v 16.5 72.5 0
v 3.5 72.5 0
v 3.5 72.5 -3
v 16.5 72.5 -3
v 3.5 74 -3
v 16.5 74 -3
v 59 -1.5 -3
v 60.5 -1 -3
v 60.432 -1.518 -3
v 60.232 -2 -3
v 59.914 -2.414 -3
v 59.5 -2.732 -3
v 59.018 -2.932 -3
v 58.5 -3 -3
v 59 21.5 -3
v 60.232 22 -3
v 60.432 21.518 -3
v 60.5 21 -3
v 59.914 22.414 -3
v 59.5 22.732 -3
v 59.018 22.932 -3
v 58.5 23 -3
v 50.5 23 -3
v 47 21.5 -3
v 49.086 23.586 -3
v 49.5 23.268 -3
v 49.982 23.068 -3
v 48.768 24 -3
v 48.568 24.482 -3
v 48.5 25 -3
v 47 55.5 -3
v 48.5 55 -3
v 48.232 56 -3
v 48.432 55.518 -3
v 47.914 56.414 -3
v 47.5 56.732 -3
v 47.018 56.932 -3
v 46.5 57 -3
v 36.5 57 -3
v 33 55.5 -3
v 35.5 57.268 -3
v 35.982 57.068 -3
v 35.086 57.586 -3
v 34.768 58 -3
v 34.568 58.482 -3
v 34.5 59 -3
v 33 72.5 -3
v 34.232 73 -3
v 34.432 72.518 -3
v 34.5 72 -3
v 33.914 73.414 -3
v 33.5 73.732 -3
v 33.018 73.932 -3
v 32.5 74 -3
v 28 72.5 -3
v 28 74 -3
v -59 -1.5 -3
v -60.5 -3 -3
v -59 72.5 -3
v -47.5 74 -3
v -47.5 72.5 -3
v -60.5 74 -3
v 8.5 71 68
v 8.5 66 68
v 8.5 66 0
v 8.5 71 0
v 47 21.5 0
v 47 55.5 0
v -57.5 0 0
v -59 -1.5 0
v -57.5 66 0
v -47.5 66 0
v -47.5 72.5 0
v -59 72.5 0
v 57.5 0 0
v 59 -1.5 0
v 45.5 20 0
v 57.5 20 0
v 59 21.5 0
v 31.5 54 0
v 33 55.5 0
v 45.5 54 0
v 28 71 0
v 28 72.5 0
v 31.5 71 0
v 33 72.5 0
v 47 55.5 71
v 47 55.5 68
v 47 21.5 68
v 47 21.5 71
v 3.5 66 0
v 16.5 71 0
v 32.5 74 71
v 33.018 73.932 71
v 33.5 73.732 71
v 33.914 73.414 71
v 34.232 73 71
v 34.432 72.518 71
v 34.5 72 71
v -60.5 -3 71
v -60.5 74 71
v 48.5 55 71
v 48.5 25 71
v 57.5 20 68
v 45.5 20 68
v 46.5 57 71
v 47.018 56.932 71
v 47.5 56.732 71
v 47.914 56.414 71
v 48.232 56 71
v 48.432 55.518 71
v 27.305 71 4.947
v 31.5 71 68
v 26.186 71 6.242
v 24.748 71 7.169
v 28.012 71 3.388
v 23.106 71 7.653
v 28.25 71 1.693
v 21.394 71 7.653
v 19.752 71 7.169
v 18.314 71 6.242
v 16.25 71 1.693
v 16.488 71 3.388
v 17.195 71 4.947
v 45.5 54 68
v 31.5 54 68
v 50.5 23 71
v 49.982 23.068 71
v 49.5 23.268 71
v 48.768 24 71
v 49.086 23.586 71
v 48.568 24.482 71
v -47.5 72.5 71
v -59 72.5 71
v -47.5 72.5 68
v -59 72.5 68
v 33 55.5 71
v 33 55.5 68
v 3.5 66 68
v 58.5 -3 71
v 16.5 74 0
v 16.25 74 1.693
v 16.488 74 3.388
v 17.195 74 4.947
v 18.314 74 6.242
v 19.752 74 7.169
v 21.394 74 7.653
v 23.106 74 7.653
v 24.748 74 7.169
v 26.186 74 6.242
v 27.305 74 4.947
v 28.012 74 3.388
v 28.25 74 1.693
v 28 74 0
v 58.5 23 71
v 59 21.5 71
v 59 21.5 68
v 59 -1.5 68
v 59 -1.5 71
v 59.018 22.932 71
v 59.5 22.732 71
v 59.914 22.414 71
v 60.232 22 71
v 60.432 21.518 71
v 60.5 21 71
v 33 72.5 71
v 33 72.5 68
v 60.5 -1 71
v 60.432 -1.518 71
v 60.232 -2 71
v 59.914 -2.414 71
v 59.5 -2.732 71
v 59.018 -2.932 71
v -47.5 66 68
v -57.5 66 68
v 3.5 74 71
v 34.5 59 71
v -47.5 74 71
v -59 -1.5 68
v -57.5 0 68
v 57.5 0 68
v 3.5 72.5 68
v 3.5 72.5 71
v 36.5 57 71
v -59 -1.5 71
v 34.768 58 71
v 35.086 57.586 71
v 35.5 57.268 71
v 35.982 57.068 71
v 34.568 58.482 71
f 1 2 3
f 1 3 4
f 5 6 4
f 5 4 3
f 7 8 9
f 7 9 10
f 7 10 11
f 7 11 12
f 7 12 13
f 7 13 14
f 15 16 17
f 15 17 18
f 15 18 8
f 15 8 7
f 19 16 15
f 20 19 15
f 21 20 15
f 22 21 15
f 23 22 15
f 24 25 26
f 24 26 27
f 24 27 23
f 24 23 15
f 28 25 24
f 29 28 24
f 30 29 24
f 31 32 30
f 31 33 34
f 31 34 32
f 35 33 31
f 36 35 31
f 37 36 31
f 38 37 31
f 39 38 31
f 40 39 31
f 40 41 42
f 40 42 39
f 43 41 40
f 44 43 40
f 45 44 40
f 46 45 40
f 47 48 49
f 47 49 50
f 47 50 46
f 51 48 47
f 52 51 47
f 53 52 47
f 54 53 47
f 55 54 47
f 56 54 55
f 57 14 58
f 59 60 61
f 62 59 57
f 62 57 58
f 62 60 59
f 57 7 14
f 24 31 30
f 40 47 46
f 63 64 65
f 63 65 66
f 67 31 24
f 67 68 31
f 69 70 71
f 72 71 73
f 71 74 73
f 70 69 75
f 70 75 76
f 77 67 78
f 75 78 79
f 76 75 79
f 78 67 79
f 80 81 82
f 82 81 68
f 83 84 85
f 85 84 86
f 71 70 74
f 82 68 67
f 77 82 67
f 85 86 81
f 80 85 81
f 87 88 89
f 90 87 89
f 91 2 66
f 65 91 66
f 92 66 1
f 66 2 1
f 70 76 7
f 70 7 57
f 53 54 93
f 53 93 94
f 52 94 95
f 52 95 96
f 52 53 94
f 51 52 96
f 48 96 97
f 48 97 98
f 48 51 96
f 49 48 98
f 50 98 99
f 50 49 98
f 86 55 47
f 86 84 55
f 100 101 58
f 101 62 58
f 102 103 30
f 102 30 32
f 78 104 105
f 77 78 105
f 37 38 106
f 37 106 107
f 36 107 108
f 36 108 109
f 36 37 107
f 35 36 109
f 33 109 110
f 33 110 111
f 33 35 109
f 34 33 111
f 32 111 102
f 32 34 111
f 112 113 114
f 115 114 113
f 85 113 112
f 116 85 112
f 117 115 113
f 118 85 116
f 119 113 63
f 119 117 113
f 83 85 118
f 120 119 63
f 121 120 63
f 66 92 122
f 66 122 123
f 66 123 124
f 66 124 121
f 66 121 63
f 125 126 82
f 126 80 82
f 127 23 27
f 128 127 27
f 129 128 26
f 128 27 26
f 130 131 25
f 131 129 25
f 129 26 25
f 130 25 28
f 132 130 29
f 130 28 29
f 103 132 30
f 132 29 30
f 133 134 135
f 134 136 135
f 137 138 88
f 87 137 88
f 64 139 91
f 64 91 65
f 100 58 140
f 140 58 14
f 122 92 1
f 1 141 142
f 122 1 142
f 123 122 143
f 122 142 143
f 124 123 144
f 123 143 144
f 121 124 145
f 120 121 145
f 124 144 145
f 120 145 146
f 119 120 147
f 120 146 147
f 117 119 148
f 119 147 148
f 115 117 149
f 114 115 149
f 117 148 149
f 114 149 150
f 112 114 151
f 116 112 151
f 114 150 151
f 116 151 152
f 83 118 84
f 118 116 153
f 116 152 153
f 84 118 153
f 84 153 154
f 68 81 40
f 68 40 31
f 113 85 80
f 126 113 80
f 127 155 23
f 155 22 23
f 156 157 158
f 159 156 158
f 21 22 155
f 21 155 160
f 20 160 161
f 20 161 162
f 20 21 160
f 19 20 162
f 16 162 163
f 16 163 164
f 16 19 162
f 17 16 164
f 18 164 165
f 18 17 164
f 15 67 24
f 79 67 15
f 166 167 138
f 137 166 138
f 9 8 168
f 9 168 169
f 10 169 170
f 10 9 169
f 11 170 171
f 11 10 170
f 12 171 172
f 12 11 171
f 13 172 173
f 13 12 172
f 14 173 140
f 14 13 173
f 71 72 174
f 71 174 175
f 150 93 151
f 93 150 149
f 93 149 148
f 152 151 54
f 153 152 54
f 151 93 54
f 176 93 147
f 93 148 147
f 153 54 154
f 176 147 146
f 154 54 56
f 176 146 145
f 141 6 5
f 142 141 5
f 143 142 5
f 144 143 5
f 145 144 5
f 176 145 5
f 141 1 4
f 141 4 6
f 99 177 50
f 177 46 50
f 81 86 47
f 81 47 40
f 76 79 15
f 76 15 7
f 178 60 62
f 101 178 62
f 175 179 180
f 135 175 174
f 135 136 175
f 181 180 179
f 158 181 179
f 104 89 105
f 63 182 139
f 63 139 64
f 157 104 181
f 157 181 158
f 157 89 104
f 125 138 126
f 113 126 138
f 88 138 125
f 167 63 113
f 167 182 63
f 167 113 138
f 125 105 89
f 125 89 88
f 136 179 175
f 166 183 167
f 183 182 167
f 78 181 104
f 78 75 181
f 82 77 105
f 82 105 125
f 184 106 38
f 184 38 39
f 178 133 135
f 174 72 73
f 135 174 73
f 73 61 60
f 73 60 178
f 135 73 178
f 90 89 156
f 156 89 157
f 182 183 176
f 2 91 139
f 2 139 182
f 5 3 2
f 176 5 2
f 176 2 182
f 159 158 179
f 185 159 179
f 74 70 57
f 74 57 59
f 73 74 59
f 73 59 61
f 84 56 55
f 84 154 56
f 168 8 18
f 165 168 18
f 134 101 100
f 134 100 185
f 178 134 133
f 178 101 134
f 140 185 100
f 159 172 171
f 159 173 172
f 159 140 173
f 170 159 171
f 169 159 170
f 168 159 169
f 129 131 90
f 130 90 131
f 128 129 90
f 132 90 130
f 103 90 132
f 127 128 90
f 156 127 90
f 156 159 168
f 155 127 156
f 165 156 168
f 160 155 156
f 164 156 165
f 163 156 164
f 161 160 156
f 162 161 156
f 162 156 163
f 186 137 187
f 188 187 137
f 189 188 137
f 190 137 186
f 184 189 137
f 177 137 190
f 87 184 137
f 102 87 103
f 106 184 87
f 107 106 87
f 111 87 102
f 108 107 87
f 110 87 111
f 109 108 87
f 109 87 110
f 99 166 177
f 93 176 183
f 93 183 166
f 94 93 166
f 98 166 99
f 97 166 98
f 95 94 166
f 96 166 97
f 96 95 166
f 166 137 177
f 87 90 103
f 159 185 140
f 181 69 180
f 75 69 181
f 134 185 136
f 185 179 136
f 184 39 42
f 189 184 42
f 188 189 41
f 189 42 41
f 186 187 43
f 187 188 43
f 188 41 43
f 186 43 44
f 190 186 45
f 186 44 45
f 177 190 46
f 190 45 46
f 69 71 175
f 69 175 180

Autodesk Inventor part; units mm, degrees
ref_plane "YZ Plane" through (0, 0, 0) normal (1, 0, 0) x (0, 1, 0)
ref_plane "XZ Plane" through (0, 0, 0) normal (0, 1, 0) x (-1, 0, 0)
ref_plane "XY Plane" through (0, 0, 0) normal (0, 0, 1) x (1, 0, 0)
sketch "Skizze1" plane through (0, 0, 0) normal (0, 0, 1) x (1, 0, 0)
  line L0 (-57.5, 0) -> (57.5, 0)
  line L1 (57.5, 0) -> (57.5, 20)
  line L2 (57.5, 20) -> (45.5, 20)
  line L3 (45.5, 20) -> (45.5, 54)
  line L4 (-57.5, 41) -> (-57.5, 0)
  line L5 (-57.5, 41) -> (-57.5, 41)
  line L6 (-57.5, 54) -> (-57.5, 54)
  line L7 (-57.5, 54) -> (-57.5, 41)
  line L8 (31.5, 71) -> (31.5, 54)
  line L9 (31.5, 54) -> (45.5, 54)
  circle A0 centre (-52, 2.832) radius 1.25
  circle A1 centre (30.6262, 2.832) radius 1.25
  circle A2 centre (30.6262, 51.168) radius 1.25
  circle A3 centre (-44.507, 51.168) radius 1.25
  line L10 (33.3762, 2.832) -> (33.3762, 0)
  line L11 (33.3762, 0) -> (27.8762, 0)
  line L12 (27.8762, 0) -> (27.8762, 2.832)
  arc A4 (33.3762, 2.832) -> (27.8762, 2.832) centre (30.6262, 2.832) ccw
  line L13 (-49.25, 0) -> (-49.25, 2.832)
  line L14 (-54.75, 0) -> (-54.75, 2.832)
  line L15 (-49.25, 0) -> (-54.75, 0)
  arc A5 (-49.25, 2.832) -> (-54.75, 2.832) centre (-52, 2.832) ccw
  line L16 (33.3762, 51.168) -> (33.3762, 54)
  line L17 (33.3762, 54) -> (27.8762, 54)
  line L18 (27.8762, 54) -> (27.8762, 51.168)
  arc A6 (27.8762, 51.168) -> (33.3762, 51.168) centre (30.6262, 51.168) ccw
  line L19 (-41.757, 51.168) -> (-41.757, 54)
  line L20 (-41.757, 54) -> (-47.257, 54)
  line L21 (-47.257, 54) -> (-47.257, 51.168)
  arc A7 (-47.257, 51.168) -> (-41.757, 51.168) centre (-44.507, 51.168) ccw
  line L22 (-57.5, 54) -> (31.5, 54)
  line L23 (31.5, 54) -> (31.5, 57)
  line L24 (31.5, 57) -> (-57.5, 57)
  line L25 (-57.5, 57) -> (-57.5, 54)
  line L26 (31.5, 71) -> (-57.5, 71)
  line L27 (-57.5, 71) -> (-57.5, 54)
  line L28 (48.5, 23) -> (60.5, 23)
  line L29 (60.5, 23) -> (60.5, -3)
  line L30 (60.5, -3) -> (-60.5, -3)
  line L31 (-60.5, -3) -> (-60.5, 44)
  line L32 (-60.5, 44) -> (-60.5, 44)
  line L33 (-60.5, 44) -> (-60.5, 57)
  line L34 (-60.5, 57) -> (-60.5, 57)
  line L35 (-60.5, 57) -> (-60.5, 74)
  line L36 (-60.5, 74) -> (34.5, 74)
  line L37 (34.5, 74) -> (34.5, 57)
  line L38 (34.5, 57) -> (48.5, 57)
  line L39 (48.5, 57) -> (48.5, 23)
  line L40 (-57.5, 71) -> (-47.5, 71)
  line L41 (-47.5, 71) -> (-47.5, 66)
  line L42 (-47.5, 66) -> (-57.5, 66)
  line L43 (-57.5, 66) -> (-57.5, 71)
  line L44 (8.5, 71) -> (3.5, 71)
  line L45 (3.5, 71) -> (3.5, 66)
  line L46 (3.5, 66) -> (8.5, 66)
  line L47 (8.5, 66) -> (8.5, 71)
  line L48 (-47.5, 71) -> (3.5, 71)
  line L49 (3.5, 71) -> (3.5, 74)
  line L50 (3.5, 74) -> (-47.5, 74)
  line L51 (-47.5, 74) -> (-47.5, 71)
  point P0 (0, 0)
  point P1 (0, 0)
  point P2 (0, 0)
  point P3 (0, 0)
  dimension "d0" = 115
  dimension "d1" = 12
  dimension "d2" = 20
  dimension "d3" = 41
  dimension "d4" = 54
  dimension "d5" = 5.5
  dimension "d6" = 82.6262
  dimension "d7" = 2.5
  dimension "d8" = 2.832
  dimension "d9" = 7.493
  dimension "d10" = 48.336
  dimension "d11" = 5.5
  dimension "d12" = 5.5
  dimension "d13" = 5.5
  dimension "d14" = 5.5
  dimension "d15" = 3
  dimension "d16" = 0
  dimension "d17" = 89
  dimension "d18" = 71
  dimension "d19" = 3
  dimension "d20" = 2.832
  dimension "d29" = 10
  dimension "d30" = 5
  dimension "d31" = 5
  dimension "d34" = 51
  dimension "d40" = 0
extrude "Extrusion1" add sketch "Skizze1" along normal blind 68 contours L0 L1 L2 L3 L9 L8 L26 L49 L36 L37 L38 L39 L28 L29 L30 L31 L33 L35 L51 L27 L25 L7 L4 | L27 L26 L41 L42 | L47 L46 L45 L26
sketch "Skizze3" plane through (3.5, 74, 0) normal (0, 1, 0) x (1, 0, 0)
  line L0 (31, 0) -> (31, -68) projected
  line L1 (28, 0) -> (5, 0) projected
  arc A0 (13, 0) -> (24.5, 0) centre (18.75, -1.7139) ccw
  line L2 (13, 0) -> (24.5, 0)
  point P0 (-3.5, 0)
  dimension "d35" = 6
  dimension "d36" = 12.25
  dimension "d39" = 11.5
extrude "Extrusion4" cut sketch "Skizze3" against normal up to surface (3 mm away)
sketch "Skizze4" plane through (0, 0, 68) normal (0, 0, 1) x (1, 0, 0)
  line L0 (57.5, 0) -> (-57.5, 0) projected
  line L1 (-47.5, 74) -> (-60.5, 74) projected
  line L2 (-60.5, 74) -> (-60.5, -3) projected
  line L3 (48.5, 23) -> (48.5, 57) projected
  line L4 (48.5, 57) -> (34.5, 57) projected
  line L5 (34.5, 74) -> (3.5, 74) projected
  line L6 (-47.5, 74) -> (-60.5, 74)
  line L7 (-60.5, 74) -> (-60.5, -3)
  line L8 (-60.5, -3) -> (60.5, -3)
  line L9 (60.5, -3) -> (60.5, 23)
  line L10 (60.5, 23) -> (48.5, 23)
  line L11 (48.5, 23) -> (48.5, 57)
  line L12 (48.5, 57) -> (34.5, 57)
  line L13 (34.5, 57) -> (34.5, 74)
  line L14 (34.5, 74) -> (3.5, 74)
  line L15 (3.5, 72.5) -> (33, 72.5)
  line L16 (33, 72.5) -> (33, 55.5)
  line L17 (33, 55.5) -> (47, 55.5)
  line L18 (47, 55.5) -> (47, 21.5)
  line L19 (47, 21.5) -> (59, 21.5)
  line L20 (59, 21.5) -> (59, -1.5)
  line L21 (59, -1.5) -> (-59, -1.5)
  line L22 (-59, -1.5) -> (-59, 72.5)
  line L23 (-59, 72.5) -> (-47.5, 72.5)
  line L24 (3.5, 72.5) -> (3.5, 74)
  line L25 (-47.5, 72.5) -> (-47.5, 74)
  point P0 (0, 0)
  dimension "d41" = 1.5
extrude "Extrusion5" add sketch "Skizze4" along normal blind 3
sketch "Skizze5" plane through (0, 0, 0) normal (0, 0, -1) x (-1, 0, 0)
  line L0 (-34.5, 74) -> (-34.5, 57) projected
  line L1 (-48.5, 23) -> (-60.5, 23) projected
  line L2 (47.5, 74) -> (47.5, 66) projected
  line L3 (-28, 74) -> (-34.5, 74)
  line L4 (-34.5, 74) -> (-34.5, 57)
  line L5 (-34.5, 57) -> (-48.5, 57)
  line L6 (-48.5, 57) -> (-48.5, 23)
  line L7 (-48.5, 23) -> (-60.5, 23)
  line L8 (-60.5, 23) -> (-60.5, -3)
  line L9 (60.5, 74) -> (60.5, -3) projected
  line L10 (-60.5, -3) -> (60.5, -3)
  line L11 (60.5, -3) -> (60.5, 74)
  line L12 (60.5, 74) -> (47.5, 74)
  line L13 (-28, 72.5) -> (-33, 72.5)
  line L14 (-33, 72.5) -> (-33, 55.5)
  line L15 (-33, 55.5) -> (-47, 55.5)
  line L16 (-47, 55.5) -> (-47, 21.5)
  line L17 (-47, 21.5) -> (-59, 21.5)
  line L18 (-59, 21.5) -> (-59, -1.5)
  line L19 (-59, -1.5) -> (59, -1.5)
  line L20 (59, -1.5) -> (59, 72.5)
  line L21 (59, 72.5) -> (47.5, 72.5)
  line L22 (-28, 74) -> (-28, 72.5)
  line L23 (47.5, 74) -> (60.5, 74) projected
  line L24 (47.5, 66) -> (47.5, 72.5) projected
  line L25 (47.5, 74) -> (47.5, 72.5)
  line L26 (-3.5, 74) -> (-16.5, 74) projected
  line L27 (-3.5, 72.5) -> (-3.5, 66) projected
  line L28 (-16.5, 74) -> (-3.5, 74)
  line L29 (-3.5, 74) -> (-3.5, 72.5)
  line L30 (-3.5, 72.5) -> (-16.5, 72.5)
  line L31 (-16.5, 72.5) -> (-16.5, 74)
  point P0 (0, 0)
  dimension "d44" = 1.5
  dimension "d47" = 1.5
extrude "Extrusion6" add sketch "Skizze5" along normal blind 3
fillet "Rundung1" radius 2 6 edges at (60.5, -3, 34) (60.5, 23, 34) (48.5, 57, 34) (34.5, 74, 34) (34.5, 57, 34) (48.5, 23, 34)
equation "\"d47\" = d44"
properties part number "Display"
